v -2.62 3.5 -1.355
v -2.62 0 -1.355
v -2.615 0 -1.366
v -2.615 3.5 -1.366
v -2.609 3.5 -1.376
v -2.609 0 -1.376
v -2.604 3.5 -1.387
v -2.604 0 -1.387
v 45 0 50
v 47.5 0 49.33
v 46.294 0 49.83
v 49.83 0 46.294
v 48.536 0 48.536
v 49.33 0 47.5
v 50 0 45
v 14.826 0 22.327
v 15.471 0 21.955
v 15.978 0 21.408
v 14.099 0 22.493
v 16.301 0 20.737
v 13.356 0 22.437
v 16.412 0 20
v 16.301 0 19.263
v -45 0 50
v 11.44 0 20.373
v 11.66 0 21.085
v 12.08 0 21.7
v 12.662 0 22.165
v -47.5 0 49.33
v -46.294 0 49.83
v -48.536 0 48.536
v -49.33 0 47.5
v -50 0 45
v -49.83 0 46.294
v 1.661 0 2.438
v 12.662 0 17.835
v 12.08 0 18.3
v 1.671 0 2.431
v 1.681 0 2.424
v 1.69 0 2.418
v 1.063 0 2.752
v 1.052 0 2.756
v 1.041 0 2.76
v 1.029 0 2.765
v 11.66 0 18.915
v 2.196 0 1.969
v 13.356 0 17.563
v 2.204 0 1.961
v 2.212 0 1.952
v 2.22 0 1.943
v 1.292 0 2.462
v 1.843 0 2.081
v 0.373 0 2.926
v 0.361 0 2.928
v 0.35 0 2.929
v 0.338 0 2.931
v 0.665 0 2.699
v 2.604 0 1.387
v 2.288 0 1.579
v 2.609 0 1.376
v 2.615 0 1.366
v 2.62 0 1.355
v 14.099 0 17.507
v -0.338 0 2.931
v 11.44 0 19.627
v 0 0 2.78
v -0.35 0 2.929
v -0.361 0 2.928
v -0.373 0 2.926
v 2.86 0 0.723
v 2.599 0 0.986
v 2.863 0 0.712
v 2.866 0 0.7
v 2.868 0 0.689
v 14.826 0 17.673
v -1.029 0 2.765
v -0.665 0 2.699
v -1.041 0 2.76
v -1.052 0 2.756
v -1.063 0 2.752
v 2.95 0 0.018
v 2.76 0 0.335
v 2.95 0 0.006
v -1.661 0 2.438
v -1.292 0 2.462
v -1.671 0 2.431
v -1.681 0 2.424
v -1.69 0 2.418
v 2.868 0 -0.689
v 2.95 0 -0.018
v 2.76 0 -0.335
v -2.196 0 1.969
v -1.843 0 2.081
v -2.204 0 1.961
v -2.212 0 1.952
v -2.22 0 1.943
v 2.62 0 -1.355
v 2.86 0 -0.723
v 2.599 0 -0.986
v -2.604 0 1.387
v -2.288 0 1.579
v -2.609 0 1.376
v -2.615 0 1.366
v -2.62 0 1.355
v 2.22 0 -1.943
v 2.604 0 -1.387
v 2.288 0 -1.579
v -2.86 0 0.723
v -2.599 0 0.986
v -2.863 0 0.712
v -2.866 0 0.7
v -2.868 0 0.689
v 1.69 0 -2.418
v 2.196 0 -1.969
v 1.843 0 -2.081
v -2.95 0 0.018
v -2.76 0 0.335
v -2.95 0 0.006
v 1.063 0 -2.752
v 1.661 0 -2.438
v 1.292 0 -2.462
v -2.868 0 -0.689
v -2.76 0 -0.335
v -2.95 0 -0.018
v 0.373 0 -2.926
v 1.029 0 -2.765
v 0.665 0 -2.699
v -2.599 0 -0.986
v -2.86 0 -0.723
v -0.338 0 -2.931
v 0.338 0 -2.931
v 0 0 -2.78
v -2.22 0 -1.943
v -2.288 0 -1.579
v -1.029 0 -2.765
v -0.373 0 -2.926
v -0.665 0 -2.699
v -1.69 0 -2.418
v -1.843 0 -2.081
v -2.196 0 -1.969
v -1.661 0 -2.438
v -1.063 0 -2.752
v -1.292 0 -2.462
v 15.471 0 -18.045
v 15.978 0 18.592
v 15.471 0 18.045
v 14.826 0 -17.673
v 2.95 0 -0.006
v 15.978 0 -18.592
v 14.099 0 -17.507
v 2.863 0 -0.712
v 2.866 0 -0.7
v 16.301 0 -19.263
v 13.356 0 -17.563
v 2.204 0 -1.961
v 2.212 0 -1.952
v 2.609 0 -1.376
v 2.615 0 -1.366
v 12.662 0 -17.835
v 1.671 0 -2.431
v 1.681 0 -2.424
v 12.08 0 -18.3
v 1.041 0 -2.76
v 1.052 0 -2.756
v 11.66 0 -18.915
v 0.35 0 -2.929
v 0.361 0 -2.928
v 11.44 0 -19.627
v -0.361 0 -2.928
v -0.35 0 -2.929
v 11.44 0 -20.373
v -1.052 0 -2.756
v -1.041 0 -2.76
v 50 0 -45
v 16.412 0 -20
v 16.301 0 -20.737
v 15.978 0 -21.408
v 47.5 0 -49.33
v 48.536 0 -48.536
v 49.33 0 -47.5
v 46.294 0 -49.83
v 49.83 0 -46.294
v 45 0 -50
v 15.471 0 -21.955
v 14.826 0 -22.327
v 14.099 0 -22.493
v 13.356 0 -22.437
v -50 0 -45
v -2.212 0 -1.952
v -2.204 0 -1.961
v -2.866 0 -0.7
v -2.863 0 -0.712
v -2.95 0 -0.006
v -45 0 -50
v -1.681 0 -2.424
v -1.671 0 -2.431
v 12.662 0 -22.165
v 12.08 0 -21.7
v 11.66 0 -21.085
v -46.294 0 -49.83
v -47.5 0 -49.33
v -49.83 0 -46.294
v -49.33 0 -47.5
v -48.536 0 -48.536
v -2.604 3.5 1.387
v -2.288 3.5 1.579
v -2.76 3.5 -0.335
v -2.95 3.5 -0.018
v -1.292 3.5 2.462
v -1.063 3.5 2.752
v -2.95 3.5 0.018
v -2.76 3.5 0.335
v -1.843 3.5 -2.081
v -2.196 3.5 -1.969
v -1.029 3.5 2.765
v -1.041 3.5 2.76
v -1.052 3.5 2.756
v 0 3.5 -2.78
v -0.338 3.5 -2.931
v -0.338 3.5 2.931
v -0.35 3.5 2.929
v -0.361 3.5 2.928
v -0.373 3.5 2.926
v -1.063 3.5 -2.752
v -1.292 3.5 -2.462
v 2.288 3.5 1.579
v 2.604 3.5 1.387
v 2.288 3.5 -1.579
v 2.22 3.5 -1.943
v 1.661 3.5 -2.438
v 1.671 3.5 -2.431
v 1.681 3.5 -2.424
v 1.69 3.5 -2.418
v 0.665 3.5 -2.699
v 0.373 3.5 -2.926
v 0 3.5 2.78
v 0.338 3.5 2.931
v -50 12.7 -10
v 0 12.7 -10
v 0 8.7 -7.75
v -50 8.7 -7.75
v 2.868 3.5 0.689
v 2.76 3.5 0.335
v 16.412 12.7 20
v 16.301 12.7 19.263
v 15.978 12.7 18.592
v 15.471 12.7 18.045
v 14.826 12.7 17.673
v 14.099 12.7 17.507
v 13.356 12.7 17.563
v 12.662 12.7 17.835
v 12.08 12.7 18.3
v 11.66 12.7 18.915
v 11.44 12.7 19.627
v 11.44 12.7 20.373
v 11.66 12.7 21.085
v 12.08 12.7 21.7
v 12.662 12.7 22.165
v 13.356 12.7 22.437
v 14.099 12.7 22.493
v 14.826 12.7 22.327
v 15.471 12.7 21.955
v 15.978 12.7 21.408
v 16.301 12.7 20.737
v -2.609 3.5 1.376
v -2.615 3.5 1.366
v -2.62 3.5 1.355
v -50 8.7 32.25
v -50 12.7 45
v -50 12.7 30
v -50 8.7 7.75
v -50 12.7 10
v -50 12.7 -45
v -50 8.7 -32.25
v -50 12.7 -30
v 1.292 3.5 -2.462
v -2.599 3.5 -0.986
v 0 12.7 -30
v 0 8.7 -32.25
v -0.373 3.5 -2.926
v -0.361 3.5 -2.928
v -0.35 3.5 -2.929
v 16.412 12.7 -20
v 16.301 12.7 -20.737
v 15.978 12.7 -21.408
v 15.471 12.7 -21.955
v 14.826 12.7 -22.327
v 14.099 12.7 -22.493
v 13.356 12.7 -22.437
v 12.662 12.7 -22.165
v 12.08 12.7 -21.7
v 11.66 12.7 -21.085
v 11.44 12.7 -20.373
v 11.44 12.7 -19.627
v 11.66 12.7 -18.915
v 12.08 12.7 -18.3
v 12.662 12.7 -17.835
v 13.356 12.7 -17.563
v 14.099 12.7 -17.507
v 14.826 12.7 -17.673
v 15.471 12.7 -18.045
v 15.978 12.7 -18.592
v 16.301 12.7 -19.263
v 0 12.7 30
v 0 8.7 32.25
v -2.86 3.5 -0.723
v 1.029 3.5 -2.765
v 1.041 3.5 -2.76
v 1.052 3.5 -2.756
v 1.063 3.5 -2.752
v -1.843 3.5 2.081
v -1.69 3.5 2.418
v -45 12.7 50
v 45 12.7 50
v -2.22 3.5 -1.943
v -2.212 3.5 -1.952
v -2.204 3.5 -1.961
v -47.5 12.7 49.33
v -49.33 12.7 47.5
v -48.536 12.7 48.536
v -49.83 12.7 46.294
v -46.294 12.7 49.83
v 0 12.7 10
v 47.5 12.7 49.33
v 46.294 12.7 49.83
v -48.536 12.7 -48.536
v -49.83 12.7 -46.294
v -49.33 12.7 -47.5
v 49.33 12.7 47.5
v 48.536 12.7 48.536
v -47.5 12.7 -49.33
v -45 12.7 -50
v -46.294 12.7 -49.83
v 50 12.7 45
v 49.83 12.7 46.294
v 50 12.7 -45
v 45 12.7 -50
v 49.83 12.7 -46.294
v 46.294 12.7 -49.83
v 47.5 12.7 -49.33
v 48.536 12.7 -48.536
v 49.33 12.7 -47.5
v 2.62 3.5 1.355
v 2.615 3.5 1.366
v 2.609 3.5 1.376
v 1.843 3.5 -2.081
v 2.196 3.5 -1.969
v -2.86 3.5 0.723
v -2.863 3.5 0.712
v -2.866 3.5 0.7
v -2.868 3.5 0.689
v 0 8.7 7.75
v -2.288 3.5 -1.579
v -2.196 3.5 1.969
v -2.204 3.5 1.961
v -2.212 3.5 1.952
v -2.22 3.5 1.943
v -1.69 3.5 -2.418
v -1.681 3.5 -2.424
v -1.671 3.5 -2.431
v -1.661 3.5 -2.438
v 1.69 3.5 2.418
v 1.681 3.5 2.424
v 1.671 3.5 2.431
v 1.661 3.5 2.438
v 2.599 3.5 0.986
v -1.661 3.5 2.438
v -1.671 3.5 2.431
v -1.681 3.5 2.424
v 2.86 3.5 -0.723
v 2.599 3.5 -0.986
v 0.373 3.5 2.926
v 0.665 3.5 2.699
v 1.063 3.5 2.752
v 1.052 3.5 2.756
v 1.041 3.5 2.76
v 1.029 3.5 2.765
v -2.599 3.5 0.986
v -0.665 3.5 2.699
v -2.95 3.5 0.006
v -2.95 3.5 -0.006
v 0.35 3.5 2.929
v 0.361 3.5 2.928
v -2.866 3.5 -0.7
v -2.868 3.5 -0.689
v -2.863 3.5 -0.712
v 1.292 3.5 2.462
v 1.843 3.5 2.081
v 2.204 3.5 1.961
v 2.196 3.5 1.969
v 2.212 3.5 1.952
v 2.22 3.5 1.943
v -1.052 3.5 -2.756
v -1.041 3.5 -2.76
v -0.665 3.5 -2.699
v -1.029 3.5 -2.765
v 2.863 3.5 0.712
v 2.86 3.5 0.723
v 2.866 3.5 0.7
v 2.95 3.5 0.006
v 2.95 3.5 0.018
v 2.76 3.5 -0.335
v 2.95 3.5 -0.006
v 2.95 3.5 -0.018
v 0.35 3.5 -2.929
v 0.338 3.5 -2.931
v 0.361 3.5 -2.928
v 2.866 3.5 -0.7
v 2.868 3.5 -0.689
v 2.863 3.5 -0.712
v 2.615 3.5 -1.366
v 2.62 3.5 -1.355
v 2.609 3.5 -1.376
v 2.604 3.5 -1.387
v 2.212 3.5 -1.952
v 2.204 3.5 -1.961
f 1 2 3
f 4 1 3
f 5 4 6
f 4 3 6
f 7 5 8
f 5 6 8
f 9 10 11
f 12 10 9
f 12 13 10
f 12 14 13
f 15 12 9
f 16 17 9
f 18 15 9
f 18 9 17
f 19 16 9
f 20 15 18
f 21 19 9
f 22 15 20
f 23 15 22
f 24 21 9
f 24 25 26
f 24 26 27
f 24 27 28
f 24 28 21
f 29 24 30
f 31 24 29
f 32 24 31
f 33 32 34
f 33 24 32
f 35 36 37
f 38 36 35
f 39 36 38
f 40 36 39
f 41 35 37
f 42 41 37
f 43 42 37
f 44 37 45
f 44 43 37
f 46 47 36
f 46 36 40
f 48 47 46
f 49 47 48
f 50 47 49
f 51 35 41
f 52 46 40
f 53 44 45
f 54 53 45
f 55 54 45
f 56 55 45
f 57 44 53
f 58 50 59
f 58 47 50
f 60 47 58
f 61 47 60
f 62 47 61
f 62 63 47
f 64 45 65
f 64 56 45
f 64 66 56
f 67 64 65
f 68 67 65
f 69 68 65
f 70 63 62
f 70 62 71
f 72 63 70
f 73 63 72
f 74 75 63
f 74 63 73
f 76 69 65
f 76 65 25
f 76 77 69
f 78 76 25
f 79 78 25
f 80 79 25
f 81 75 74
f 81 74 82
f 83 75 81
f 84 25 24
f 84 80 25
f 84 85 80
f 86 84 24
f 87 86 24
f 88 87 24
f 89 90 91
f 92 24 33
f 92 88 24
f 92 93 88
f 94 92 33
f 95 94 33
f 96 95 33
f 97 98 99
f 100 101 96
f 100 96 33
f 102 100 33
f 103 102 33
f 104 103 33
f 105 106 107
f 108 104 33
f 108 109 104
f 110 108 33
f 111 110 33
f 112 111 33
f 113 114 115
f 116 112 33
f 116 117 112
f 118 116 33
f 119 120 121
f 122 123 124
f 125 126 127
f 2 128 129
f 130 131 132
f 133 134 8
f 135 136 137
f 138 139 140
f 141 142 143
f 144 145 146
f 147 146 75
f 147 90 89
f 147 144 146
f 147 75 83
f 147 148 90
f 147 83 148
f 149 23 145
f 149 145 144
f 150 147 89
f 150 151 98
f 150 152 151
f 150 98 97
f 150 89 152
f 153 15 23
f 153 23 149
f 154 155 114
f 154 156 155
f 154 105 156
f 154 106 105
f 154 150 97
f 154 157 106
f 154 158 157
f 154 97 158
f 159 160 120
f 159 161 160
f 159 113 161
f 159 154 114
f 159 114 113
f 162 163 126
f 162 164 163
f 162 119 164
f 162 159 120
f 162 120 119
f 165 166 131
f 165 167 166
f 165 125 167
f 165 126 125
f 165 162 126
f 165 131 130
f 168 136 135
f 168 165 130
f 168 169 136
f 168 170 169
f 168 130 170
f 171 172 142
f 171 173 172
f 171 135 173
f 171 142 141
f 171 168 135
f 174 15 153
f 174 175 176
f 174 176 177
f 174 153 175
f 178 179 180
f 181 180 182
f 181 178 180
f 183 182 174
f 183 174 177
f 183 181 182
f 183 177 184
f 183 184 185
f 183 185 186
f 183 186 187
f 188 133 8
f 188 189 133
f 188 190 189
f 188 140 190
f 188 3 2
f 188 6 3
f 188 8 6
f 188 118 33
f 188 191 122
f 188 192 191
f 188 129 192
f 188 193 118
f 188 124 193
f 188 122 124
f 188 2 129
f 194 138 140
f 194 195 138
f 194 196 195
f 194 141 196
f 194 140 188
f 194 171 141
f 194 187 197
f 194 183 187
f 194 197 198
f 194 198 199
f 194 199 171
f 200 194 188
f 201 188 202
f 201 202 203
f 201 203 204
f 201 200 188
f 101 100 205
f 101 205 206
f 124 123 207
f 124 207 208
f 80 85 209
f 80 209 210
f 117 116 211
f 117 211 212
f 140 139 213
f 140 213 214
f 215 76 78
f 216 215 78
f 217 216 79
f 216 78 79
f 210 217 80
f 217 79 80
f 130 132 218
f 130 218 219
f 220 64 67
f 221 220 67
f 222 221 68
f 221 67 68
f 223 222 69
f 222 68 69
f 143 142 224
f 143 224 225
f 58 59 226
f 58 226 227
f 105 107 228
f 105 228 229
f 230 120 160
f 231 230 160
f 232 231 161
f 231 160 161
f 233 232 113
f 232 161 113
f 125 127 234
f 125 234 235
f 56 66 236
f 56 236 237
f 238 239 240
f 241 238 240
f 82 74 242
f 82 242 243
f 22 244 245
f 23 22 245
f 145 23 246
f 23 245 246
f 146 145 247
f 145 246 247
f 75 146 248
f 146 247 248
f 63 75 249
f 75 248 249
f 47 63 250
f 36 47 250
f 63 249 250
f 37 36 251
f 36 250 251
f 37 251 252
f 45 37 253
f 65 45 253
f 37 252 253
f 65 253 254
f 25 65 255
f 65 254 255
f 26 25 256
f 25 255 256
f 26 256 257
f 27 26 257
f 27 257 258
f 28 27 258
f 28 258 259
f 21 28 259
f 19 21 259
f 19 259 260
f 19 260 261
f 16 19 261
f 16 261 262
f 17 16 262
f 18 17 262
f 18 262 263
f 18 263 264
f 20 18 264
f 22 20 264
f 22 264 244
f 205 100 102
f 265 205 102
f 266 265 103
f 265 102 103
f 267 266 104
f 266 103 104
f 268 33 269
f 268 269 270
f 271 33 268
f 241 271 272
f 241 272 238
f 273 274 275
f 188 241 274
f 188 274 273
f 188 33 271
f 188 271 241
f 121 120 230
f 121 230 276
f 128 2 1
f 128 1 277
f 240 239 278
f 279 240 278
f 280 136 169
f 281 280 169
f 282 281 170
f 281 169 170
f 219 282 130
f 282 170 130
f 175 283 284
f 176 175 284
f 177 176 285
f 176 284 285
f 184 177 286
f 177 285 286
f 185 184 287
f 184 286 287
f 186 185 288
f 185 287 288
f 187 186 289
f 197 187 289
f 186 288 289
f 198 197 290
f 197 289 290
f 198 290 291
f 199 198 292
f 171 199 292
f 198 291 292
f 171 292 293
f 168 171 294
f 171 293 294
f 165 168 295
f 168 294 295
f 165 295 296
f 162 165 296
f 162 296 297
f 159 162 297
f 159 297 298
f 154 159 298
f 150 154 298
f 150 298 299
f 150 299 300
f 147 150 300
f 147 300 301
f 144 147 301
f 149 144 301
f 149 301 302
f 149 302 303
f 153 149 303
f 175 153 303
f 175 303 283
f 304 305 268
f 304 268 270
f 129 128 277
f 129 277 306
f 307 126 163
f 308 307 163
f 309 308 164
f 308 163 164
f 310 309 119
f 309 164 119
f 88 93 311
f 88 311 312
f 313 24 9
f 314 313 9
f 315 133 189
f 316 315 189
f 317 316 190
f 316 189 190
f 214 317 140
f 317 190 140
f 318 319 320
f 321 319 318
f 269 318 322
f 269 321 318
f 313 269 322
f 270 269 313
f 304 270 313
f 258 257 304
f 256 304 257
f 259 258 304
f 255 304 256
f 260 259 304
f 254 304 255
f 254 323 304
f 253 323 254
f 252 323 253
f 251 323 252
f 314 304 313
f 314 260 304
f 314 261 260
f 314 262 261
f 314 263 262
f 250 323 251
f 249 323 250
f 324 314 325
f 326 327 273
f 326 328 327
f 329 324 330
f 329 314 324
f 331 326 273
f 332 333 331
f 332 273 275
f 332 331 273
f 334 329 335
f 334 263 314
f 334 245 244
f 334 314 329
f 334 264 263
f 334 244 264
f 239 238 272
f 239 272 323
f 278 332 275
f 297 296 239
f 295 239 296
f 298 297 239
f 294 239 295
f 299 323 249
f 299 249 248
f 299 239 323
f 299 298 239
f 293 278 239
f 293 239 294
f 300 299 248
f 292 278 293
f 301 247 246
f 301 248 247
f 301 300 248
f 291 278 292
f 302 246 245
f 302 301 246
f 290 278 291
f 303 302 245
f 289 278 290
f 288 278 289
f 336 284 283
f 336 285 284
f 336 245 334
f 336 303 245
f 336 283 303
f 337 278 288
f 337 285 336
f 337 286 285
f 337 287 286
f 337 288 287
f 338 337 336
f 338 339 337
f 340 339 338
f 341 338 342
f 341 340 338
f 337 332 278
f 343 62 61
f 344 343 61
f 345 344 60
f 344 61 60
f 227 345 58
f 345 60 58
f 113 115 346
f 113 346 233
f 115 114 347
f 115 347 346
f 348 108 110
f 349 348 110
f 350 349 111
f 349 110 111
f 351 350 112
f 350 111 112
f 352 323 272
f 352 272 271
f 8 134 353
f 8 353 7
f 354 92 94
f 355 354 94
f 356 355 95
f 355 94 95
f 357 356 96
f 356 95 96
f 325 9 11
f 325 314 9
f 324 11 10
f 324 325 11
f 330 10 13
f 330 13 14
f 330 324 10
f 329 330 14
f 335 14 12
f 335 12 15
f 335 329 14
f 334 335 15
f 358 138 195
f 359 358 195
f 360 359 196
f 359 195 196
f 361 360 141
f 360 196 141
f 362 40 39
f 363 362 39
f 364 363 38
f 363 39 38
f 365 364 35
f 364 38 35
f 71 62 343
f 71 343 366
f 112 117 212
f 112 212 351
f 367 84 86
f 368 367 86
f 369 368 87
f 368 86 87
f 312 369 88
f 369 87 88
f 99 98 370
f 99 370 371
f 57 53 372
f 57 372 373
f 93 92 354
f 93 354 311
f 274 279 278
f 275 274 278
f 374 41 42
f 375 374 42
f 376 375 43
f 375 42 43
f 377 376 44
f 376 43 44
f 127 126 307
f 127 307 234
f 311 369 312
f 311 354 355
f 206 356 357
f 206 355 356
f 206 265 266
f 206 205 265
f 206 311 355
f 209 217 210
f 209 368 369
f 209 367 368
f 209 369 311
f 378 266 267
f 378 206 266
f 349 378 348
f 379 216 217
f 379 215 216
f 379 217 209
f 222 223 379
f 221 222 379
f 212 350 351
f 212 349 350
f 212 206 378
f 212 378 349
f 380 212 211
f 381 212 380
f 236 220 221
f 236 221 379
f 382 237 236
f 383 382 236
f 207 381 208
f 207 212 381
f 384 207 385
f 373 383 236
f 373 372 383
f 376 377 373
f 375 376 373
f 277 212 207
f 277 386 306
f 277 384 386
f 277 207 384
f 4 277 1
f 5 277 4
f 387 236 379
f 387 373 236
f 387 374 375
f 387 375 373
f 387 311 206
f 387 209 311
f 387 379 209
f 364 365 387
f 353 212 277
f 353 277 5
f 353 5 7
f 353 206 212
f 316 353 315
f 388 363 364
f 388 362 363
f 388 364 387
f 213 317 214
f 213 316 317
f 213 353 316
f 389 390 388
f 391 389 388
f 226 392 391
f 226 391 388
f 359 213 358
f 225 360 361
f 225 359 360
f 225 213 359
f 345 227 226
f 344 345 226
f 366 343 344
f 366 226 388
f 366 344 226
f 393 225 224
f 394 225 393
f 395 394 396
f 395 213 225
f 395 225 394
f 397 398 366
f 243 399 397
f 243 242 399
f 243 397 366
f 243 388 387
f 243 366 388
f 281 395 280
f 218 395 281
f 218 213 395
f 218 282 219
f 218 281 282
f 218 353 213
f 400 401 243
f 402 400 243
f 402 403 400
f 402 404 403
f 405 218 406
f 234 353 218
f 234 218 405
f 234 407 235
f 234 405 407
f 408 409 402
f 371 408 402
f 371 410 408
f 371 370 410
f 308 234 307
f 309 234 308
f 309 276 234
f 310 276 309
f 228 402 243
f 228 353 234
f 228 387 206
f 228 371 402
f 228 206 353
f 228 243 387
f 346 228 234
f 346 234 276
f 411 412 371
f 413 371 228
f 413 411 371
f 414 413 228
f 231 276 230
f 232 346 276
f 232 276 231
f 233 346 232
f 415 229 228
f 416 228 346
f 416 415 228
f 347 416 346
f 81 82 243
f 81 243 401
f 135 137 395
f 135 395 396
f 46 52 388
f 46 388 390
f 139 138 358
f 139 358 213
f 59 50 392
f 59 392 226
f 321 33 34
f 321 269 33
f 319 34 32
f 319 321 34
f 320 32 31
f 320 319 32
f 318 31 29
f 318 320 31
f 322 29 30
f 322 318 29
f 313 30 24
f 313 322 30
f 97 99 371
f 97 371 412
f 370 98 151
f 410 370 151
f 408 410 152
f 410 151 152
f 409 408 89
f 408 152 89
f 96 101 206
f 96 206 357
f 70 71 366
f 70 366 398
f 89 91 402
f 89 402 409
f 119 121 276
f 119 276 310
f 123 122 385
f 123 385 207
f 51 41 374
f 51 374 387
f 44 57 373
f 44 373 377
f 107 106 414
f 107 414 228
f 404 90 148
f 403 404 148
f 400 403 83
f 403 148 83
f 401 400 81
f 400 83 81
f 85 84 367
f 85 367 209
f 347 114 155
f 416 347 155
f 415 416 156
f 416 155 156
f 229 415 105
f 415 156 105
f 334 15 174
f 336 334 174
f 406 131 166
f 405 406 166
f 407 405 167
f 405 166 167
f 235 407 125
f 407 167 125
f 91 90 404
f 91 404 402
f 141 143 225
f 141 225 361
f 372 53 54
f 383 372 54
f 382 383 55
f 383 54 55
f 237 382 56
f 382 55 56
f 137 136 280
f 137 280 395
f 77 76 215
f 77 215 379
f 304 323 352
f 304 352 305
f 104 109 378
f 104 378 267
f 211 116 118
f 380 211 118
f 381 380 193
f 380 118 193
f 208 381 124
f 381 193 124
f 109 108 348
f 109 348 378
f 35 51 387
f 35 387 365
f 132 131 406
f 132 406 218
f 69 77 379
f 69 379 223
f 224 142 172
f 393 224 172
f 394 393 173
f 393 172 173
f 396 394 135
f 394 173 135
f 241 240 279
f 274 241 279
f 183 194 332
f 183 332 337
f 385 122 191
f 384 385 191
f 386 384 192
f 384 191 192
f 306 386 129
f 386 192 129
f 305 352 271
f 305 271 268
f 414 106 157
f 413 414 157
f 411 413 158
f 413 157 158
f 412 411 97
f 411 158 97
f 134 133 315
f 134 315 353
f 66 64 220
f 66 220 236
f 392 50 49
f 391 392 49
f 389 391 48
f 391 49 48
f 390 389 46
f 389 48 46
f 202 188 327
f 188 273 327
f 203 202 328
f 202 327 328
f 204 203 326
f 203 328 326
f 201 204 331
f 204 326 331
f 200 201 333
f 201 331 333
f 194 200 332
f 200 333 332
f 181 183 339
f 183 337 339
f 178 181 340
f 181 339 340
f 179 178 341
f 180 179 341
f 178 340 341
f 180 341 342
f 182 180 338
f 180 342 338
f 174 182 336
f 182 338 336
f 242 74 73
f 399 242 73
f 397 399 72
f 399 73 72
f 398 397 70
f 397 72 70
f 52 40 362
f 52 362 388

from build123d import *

# Parameters (mm, degrees)
ESBO_O2_W                = 100
ESBO_O2_H                = 100
RESSALTO_EXTRUS_O1_DEPTH = 12.7
CORTE_EXTRUS_O1_DEPTH    = 72.842118566
ESBO_O7_R                = 2.95
CORTE_EXTRUS_O3_DEPTH    = 3.5
RESSALTO_EXTRUS_O4_DEPTH = 3.5
PADR_OCIRCULAR1_COUNT    = 26
FILETE2_R                = 5
FURO_ROSCADO_DE_M61_D    = 5


with BuildPart() as part:
    # Esboço2 → Ressalto-extrusão1 (new body)
    with BuildSketch(Plane(origin=(0, 0, 0), x_dir=(1, 0, 0), z_dir=(0, 1, 0))):
        Rectangle(ESBO_O2_W, ESBO_O2_H)
    extrude(amount=RESSALTO_EXTRUS_O1_DEPTH)

    # Esboço4 → Corte-extrusão1 (cut, through all)
    with BuildSketch(Plane(origin=(0, 0, 0), x_dir=(0, 0, -1), z_dir=(1, 0, 0))):
        Polygon((-30, 12.7), (-10, 12.7), (-7.75, 8.7), (-32.25, 8.7), align=None)
    corte_extrus_o1 = extrude(amount=-CORTE_EXTRUS_O1_DEPTH, mode=Mode.SUBTRACT)

    # Espelhar1: Corte-extrusão1 across plane
    add(corte_extrus_o1.mirror(Plane.XY), mode=Mode.SUBTRACT)

    # Esboço7 → Corte-extrusão3 (cut)
    with BuildSketch(Plane.XZ):
        with Locations(Location((0, 0, 0), (0, 0, 270))):
            Circle(ESBO_O7_R)
    extrude(amount=-CORTE_EXTRUS_O3_DEPTH, mode=Mode.SUBTRACT)

    # Esboço8 → Ressalto-extrusão4 (add)
    with BuildSketch(Plane(origin=(0, 0, 0), x_dir=(-1, 0, 0), z_dir=(0, -1, 0))):
        Polygon((0, -2.78), (-0.337974861, -2.93057554), (-0.337974861, -2.981739448), (0.337974861, -2.981739448), (0.337974861, -2.93057554), align=None)
    ressalto_extrus_o4 = extrude(amount=-RESSALTO_EXTRUS_O4_DEPTH)

    # PadrãoCircular1: Ressalto-extrusão4 ×26 about axis
    padr_ocircular1_axis = Axis((0, 0, 0), (0, 1, 0))
    for i in range(1, PADR_OCIRCULAR1_COUNT):
        add(ressalto_extrus_o4.rotate(padr_ocircular1_axis, i * 360 / PADR_OCIRCULAR1_COUNT))

    # Filete2
    filete2_edges = [part.edges().sort_by_distance(p)[0] for p in [
        (-50, 6.35, -50),
        (50, 6.35, -50),
        (50, 6.35, 50),
        (-50, 6.35, 50),
    ]]
    fillet(filete2_edges, radius=FILETE2_R)

    # Furo roscado de M61 (through all)
    with Locations(Plane(origin=(0, 0, 0), x_dir=(-1, 0, 0), z_dir=(0, -1, 0))):
        with Locations((-13.9125, -20), (-13.9125, 20)):
            Hole(FURO_ROSCADO_DE_M61_D / 2)


solid = part.part
